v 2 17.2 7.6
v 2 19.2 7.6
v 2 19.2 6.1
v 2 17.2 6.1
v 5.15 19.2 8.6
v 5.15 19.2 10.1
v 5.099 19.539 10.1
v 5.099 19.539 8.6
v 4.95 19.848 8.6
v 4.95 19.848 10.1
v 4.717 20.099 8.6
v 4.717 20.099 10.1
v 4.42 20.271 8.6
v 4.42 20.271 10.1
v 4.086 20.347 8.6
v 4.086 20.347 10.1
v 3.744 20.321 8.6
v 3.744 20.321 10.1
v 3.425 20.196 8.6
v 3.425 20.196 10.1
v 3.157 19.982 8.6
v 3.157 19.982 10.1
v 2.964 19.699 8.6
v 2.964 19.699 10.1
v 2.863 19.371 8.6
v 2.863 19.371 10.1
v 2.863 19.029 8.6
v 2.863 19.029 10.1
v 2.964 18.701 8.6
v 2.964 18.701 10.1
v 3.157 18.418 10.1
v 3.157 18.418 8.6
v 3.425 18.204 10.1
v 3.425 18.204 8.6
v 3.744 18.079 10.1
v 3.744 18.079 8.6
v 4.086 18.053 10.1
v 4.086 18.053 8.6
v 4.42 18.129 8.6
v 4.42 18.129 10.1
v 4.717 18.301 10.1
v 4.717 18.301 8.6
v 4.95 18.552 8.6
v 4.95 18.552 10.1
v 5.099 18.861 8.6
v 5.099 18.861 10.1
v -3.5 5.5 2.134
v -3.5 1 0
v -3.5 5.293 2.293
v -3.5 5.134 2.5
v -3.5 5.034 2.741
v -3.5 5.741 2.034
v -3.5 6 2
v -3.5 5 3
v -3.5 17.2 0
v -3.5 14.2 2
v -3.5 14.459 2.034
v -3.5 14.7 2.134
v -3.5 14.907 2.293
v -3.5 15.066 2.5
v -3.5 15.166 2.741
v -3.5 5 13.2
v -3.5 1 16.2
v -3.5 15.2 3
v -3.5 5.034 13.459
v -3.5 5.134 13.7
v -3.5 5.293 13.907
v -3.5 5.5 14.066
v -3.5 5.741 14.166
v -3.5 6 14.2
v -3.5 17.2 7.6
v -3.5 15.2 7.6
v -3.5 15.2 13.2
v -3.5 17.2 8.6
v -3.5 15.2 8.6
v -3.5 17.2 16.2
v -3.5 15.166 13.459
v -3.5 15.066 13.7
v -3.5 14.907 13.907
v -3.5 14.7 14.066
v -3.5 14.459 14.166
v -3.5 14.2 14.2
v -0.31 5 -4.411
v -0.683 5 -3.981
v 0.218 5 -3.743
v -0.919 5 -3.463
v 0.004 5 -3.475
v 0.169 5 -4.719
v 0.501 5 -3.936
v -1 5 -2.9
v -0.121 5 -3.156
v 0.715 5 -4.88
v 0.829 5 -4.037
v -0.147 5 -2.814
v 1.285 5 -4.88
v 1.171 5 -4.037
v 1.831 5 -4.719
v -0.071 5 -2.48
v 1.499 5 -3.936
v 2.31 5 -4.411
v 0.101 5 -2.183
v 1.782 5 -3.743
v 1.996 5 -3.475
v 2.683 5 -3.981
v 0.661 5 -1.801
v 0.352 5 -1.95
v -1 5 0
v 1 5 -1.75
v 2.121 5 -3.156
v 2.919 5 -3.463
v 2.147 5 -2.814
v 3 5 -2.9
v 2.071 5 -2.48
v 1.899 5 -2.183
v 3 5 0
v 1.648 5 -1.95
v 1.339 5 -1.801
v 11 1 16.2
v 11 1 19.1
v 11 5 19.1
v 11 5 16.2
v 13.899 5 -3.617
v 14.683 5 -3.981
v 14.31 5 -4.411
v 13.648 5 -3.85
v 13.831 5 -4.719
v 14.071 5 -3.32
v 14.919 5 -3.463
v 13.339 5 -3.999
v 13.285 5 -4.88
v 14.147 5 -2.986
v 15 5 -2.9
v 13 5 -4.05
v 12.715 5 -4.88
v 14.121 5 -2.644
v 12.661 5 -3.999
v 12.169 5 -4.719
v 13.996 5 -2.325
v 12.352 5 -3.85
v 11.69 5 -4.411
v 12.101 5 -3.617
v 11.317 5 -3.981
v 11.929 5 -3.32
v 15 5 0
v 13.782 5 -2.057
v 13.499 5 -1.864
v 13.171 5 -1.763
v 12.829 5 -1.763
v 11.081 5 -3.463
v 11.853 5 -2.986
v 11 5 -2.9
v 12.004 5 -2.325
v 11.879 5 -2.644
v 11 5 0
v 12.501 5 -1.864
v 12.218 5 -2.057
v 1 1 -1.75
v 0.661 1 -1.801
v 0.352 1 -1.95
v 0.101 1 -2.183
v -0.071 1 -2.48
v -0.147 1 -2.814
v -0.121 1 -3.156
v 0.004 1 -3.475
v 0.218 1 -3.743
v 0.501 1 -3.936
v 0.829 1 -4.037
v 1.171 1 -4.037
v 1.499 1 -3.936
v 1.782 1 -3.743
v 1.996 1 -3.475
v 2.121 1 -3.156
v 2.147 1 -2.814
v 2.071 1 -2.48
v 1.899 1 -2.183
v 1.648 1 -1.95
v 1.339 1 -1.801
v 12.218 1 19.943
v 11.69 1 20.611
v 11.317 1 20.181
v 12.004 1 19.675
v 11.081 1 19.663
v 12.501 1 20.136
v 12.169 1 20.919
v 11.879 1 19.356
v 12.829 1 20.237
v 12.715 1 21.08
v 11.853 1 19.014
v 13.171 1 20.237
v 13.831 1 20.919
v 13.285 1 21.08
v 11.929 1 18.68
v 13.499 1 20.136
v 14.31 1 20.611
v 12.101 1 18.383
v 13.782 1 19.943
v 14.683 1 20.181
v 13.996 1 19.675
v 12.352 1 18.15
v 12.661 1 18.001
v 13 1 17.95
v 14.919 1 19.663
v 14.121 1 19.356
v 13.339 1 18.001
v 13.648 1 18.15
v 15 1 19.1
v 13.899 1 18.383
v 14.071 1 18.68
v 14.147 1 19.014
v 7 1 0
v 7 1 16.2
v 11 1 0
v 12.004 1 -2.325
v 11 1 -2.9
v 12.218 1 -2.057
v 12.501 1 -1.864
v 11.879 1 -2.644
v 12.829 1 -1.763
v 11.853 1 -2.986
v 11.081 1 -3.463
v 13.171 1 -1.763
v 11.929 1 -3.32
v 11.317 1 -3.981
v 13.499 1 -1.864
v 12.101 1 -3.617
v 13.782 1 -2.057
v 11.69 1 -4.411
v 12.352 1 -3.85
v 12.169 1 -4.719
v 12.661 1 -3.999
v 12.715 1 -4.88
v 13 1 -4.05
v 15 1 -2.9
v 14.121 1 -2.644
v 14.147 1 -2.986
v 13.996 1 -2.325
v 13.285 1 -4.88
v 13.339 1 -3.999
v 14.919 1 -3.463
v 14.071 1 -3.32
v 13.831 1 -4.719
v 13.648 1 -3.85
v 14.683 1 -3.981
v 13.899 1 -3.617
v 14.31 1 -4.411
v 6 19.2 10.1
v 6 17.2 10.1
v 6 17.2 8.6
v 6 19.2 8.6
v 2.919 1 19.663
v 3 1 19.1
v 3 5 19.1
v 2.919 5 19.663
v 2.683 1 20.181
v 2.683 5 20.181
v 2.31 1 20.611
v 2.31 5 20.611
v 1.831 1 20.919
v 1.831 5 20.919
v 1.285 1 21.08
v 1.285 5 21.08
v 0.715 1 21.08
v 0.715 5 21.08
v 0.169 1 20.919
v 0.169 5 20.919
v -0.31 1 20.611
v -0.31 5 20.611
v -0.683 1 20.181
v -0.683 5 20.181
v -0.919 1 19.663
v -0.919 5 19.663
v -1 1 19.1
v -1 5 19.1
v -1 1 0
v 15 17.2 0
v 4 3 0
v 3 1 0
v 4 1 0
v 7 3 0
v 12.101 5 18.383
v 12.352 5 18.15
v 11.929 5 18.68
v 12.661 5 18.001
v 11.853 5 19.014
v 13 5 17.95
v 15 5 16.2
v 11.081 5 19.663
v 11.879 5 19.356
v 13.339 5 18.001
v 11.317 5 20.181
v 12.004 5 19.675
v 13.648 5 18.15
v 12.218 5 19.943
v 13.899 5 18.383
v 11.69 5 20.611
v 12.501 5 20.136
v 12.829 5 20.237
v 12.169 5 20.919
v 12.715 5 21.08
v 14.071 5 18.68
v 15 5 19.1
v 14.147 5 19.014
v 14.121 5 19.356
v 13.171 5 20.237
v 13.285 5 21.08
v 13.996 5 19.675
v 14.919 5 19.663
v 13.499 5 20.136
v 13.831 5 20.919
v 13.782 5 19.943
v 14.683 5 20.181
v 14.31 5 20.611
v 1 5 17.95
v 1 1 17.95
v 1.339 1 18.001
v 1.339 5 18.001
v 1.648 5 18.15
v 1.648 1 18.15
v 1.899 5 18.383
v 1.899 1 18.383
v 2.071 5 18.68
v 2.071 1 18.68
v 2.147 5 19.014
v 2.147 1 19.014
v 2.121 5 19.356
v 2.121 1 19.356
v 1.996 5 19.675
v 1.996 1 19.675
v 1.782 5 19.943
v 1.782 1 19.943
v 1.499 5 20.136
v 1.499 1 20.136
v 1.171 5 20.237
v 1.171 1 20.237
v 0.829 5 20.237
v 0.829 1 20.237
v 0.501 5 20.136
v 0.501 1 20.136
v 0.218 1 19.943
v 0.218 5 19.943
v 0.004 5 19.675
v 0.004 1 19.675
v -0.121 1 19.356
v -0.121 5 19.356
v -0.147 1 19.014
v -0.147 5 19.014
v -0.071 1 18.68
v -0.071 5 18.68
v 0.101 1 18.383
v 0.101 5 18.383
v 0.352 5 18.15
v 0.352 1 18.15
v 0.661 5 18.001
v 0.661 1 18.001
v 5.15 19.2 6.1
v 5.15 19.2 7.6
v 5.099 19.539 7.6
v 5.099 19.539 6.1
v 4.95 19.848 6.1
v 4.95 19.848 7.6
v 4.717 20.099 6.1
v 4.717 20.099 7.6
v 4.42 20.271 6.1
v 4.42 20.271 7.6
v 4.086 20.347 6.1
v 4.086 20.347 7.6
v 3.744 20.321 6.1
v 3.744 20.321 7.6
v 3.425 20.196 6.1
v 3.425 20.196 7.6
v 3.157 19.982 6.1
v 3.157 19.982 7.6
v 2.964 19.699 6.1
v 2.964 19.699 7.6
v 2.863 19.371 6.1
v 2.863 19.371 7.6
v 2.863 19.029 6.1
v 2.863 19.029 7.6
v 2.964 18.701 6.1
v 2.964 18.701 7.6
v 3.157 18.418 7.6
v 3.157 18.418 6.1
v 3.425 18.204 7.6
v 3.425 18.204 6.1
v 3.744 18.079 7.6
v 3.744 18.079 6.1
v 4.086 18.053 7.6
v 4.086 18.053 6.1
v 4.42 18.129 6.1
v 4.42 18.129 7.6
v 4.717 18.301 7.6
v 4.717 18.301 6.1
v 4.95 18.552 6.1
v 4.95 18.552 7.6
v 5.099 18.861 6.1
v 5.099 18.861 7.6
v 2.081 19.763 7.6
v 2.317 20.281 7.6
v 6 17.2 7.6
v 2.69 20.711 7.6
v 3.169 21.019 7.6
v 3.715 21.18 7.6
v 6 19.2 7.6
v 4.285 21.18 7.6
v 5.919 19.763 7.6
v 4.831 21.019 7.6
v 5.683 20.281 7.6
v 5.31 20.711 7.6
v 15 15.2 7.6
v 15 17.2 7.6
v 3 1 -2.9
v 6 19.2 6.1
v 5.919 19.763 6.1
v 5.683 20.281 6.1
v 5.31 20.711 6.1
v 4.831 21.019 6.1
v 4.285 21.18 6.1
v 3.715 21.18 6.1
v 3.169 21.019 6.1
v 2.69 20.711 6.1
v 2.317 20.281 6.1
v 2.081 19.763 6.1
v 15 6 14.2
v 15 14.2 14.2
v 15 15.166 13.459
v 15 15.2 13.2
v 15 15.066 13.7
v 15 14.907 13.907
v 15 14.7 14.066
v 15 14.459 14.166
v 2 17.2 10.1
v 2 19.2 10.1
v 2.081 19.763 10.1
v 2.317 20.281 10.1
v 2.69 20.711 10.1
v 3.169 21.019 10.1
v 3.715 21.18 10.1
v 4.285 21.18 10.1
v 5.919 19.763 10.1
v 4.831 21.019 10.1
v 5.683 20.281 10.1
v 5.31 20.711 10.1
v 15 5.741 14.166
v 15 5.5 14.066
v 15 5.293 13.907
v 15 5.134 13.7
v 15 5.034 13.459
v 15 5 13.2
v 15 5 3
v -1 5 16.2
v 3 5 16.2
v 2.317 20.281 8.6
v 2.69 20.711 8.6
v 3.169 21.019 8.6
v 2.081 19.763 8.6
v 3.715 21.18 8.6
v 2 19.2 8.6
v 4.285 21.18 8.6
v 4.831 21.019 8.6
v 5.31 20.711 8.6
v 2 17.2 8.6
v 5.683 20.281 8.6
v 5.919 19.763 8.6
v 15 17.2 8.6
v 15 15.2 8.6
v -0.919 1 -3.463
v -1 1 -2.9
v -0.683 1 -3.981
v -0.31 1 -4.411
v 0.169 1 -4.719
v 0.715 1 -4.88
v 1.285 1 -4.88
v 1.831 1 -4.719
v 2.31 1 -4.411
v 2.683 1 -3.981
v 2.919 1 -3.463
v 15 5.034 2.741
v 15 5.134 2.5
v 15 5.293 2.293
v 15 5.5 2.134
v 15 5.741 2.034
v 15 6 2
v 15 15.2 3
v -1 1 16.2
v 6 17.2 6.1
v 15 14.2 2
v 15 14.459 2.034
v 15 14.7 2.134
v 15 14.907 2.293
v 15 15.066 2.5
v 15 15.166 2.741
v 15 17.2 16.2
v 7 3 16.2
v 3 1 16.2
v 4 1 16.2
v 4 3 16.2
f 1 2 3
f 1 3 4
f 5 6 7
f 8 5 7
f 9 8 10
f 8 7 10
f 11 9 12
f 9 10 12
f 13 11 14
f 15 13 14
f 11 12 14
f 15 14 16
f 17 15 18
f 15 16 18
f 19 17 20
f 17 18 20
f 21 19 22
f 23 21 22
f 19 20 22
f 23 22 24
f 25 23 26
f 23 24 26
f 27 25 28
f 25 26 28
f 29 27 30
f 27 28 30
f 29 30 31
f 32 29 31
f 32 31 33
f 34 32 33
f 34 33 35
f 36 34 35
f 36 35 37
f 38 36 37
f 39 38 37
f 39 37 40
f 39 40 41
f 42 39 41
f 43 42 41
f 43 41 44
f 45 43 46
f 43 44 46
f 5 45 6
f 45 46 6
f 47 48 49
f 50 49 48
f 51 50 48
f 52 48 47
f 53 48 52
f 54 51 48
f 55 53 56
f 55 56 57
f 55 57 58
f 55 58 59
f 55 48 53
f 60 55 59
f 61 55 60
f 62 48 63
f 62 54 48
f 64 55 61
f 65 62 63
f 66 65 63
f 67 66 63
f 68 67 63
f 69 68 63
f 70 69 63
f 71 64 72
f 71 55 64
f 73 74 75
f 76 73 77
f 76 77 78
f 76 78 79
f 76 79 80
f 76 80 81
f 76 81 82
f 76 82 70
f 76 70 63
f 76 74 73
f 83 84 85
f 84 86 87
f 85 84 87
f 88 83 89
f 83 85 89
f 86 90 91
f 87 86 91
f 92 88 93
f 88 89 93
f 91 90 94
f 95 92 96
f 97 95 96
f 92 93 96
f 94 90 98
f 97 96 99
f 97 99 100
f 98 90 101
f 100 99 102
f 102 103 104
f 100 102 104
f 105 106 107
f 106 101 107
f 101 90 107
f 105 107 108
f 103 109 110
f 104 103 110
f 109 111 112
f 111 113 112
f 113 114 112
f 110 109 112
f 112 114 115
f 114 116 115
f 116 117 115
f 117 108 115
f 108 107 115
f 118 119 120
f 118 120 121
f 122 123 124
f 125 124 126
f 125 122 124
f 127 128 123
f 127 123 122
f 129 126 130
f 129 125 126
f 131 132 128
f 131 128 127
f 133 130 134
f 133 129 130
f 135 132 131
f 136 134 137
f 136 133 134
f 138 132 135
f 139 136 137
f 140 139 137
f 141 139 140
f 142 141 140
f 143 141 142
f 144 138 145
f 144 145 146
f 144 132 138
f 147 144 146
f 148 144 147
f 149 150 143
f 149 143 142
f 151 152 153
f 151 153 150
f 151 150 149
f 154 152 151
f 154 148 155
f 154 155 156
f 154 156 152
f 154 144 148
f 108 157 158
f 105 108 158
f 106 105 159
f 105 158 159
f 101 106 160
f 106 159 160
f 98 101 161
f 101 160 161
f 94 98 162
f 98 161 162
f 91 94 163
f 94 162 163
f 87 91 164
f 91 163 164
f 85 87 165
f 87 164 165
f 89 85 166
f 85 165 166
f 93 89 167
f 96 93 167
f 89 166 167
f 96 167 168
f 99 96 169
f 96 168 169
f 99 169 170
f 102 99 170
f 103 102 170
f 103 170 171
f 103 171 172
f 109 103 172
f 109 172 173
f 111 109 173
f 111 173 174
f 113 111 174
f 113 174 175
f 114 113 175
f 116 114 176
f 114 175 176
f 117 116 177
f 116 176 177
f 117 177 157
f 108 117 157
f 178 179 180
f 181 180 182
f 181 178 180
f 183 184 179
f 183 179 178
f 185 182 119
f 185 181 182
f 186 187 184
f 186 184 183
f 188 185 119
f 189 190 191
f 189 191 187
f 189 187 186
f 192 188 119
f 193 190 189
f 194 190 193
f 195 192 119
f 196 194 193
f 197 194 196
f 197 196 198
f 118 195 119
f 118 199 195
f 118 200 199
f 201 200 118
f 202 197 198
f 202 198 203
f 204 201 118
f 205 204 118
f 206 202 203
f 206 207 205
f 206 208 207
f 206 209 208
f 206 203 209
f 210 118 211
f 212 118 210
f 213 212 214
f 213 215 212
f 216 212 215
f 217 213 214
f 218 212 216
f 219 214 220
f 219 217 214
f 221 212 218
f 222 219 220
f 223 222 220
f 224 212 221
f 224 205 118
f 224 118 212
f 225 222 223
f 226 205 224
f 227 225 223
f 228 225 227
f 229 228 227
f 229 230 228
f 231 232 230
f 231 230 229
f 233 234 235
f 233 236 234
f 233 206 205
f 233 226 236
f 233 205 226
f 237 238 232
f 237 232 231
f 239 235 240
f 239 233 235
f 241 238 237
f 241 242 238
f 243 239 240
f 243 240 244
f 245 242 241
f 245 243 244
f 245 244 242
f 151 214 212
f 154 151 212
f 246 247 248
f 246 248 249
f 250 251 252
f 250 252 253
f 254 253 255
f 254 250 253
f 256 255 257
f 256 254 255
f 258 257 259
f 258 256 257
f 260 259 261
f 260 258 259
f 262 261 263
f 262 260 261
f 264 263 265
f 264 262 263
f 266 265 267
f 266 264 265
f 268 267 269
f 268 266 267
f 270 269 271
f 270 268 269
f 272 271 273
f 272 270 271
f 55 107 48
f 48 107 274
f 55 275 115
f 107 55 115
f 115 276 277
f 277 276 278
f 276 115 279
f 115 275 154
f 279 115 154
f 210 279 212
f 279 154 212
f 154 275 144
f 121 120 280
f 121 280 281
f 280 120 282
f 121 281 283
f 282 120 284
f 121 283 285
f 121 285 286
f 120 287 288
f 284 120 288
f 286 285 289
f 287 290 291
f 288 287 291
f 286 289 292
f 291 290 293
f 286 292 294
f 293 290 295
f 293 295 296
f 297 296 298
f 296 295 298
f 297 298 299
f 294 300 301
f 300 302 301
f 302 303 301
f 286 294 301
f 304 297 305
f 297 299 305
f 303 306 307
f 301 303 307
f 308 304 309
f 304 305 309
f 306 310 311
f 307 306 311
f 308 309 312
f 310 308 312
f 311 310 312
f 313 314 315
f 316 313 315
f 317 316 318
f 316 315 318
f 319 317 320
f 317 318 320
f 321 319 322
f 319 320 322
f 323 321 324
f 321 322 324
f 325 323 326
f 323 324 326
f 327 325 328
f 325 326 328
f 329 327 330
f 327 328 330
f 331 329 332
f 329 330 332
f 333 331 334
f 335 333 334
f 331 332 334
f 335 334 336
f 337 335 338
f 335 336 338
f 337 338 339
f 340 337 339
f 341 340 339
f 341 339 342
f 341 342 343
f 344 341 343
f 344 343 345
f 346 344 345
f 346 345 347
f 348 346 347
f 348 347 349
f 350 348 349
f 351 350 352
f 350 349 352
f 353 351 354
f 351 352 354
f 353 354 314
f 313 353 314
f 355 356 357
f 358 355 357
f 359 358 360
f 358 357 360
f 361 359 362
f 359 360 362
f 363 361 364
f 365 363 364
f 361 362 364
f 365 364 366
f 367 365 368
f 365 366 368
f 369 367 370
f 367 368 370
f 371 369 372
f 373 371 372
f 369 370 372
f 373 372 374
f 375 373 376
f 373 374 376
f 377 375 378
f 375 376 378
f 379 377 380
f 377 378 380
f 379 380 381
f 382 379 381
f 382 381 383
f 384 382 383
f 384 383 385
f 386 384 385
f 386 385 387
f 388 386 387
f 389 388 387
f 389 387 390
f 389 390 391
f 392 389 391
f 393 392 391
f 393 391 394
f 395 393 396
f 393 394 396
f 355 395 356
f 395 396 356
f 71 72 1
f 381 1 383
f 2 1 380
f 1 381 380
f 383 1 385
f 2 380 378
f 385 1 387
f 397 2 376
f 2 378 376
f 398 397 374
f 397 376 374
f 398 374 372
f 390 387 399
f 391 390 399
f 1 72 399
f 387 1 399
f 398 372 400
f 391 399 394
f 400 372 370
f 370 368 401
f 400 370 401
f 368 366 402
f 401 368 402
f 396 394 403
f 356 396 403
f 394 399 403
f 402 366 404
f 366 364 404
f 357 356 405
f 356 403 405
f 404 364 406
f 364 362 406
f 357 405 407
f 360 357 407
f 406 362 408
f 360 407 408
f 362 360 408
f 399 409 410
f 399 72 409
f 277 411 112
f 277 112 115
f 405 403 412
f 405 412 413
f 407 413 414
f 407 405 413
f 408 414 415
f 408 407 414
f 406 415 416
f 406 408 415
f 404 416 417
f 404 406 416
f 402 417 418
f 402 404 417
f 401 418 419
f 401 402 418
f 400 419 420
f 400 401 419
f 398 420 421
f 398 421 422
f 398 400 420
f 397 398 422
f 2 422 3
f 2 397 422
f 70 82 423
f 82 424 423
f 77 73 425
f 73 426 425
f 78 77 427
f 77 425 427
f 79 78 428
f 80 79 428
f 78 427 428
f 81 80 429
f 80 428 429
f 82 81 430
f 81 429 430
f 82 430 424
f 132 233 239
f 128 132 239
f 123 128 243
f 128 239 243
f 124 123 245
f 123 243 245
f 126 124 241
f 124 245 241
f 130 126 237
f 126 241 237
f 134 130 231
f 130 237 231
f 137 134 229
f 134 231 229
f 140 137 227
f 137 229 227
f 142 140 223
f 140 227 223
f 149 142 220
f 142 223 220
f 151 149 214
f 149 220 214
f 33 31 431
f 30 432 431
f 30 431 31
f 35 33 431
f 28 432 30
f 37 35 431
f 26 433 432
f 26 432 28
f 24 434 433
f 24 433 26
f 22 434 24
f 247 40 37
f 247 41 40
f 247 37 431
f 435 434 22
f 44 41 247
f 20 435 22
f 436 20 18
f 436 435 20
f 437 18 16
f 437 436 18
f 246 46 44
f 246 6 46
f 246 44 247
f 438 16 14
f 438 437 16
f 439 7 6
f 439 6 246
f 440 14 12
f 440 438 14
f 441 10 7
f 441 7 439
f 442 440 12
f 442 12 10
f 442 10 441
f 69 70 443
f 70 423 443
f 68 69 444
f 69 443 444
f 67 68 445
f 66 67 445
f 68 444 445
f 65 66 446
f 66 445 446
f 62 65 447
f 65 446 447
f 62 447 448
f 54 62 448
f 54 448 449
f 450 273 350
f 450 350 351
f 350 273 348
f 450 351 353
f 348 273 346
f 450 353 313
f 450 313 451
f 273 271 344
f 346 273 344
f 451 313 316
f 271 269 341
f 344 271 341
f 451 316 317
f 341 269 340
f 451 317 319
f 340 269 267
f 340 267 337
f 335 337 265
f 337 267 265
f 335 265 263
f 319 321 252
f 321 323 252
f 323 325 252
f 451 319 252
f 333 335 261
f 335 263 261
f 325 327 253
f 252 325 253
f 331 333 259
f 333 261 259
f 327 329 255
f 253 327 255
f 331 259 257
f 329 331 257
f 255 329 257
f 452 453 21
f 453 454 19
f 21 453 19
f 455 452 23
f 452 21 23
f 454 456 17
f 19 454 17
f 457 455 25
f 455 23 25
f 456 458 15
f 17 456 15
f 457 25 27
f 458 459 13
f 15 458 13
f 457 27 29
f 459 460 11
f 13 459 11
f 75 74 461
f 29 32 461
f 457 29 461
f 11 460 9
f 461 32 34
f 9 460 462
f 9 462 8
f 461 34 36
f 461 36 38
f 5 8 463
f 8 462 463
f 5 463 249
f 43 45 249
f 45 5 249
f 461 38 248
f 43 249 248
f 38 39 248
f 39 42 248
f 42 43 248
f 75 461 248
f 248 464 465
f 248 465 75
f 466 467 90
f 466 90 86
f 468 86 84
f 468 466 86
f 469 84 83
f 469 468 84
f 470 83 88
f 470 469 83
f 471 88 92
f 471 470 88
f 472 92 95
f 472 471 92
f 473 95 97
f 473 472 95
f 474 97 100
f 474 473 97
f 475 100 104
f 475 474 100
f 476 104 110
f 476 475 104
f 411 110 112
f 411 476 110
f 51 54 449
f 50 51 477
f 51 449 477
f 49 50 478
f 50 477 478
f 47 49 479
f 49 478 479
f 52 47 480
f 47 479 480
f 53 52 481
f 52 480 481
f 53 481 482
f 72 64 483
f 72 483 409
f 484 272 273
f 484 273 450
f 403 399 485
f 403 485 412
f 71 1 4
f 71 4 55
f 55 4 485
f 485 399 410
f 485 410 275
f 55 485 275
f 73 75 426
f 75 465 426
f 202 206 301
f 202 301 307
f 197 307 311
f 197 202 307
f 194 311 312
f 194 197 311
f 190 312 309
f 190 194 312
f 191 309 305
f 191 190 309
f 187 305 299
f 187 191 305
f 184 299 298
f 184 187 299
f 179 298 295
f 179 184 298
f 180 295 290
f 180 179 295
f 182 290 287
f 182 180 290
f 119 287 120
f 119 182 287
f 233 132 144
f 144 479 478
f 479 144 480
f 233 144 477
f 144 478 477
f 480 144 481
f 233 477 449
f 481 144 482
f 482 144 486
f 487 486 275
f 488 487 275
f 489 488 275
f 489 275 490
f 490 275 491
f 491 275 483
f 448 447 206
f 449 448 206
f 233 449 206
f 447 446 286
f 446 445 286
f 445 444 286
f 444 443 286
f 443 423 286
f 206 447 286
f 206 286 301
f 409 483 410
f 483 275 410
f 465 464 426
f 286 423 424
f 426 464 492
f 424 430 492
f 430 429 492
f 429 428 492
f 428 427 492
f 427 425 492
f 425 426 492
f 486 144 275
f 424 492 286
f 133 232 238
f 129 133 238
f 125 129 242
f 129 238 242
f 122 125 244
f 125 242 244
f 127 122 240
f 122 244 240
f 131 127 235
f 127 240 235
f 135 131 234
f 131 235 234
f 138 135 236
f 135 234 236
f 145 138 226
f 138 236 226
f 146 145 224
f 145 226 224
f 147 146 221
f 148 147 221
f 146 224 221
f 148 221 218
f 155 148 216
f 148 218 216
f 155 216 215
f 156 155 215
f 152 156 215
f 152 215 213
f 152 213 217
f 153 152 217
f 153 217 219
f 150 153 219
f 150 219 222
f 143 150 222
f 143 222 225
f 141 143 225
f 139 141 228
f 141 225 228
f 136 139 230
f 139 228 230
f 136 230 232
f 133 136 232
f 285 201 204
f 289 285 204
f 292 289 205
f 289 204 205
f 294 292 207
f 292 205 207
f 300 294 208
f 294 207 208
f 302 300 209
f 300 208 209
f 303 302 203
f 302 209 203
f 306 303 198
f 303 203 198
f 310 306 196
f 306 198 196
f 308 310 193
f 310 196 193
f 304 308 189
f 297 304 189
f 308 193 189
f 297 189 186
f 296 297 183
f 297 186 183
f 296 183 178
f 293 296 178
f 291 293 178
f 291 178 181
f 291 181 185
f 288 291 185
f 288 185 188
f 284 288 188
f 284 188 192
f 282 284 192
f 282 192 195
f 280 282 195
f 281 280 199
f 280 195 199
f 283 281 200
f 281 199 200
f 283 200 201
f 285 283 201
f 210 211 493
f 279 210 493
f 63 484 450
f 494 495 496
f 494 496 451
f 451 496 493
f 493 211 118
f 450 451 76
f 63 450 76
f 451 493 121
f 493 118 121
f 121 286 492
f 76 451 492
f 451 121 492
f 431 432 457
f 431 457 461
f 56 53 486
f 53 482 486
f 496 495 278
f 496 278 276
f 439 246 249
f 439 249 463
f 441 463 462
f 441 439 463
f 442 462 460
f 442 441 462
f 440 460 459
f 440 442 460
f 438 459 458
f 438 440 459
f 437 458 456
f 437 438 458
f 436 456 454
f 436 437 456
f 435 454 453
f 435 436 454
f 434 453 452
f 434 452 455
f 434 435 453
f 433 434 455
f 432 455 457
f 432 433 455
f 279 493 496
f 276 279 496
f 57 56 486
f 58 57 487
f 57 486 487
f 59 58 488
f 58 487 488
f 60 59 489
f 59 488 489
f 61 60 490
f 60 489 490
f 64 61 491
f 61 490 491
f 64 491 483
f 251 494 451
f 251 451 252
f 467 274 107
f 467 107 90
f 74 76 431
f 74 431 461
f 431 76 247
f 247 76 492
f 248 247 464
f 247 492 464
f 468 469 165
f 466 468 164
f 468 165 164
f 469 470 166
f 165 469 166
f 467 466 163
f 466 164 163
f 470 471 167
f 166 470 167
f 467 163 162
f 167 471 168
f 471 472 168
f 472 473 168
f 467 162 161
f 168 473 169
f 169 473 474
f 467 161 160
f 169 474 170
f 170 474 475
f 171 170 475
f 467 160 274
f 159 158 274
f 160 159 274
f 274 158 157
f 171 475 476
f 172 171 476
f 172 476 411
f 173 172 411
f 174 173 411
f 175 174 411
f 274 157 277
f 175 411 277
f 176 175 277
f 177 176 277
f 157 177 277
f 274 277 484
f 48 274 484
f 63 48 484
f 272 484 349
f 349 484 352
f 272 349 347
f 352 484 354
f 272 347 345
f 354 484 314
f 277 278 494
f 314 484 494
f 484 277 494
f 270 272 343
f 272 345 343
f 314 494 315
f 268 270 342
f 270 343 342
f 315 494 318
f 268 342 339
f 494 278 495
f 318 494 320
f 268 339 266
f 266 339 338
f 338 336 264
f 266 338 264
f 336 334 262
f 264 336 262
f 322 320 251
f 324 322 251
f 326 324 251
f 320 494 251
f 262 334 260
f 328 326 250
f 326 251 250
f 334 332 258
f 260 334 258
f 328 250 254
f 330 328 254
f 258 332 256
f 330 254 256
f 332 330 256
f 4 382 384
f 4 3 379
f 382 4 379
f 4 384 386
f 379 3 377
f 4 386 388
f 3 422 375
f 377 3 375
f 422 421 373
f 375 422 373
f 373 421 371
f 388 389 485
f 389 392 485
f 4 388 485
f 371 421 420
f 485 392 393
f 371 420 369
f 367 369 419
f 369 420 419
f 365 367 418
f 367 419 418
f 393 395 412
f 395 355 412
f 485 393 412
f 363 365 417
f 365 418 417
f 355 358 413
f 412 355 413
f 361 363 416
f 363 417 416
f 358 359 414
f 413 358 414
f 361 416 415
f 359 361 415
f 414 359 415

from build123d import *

# Parameters (mm, degrees)
SKETCH_1_W           = 8
SKETCH_1_H           = 5
SKETCH_1_R           = 1.15
EXTRUDE_1_DEPTH      = 4
SKETCH_2_W           = 10.5
SKETCH_2_H           = 8
SKETCH_2_R           = 1.15
EXTRUDE_2_DEPTH      = 7
EXTRUDE_4_DEPTH      = 15
SKETCH_6_R           = 1.15
EXTRUDE_5_DEPTH      = 1.5
EXTRUDE_START        = 2.5
SKETCH_6_2_R         = 1.15
EXTRUDE_6_DEPTH      = 1.5
CUT_EXTRUDE_2_DEPTH  = 3
FILLET_2_R           = 1
SKETCH_9_OUTSIDE_W   = 25.014
SKETCH_9_OUTSIDE_H   = 34.214
SKETCH_9_OUTSIDE_W_2 = 15
SKETCH_9_OUTSIDE_H_2 = 16.2
CUT_EXTRUDE_3_DEPTH  = 36.814522194
SKETCH_12_W          = 16.2
SKETCH_12_H          = 8
CUT_EXTRUDE_5_DEPTH  = 31.608495553
SKETCH_10_W          = 3
SKETCH_10_H          = 2
CUT_EXTRUDE_4_DEPTH  = 31.608495553
SKETCH_11_R          = 1.15
EXTRUDE_7_DEPTH      = 4
EXTRUDE_15_DEPTH     = 3.5


with BuildPart() as part:
    # 草图1 → 凸台-拉伸1 (new body)
    with BuildSketch(Plane(origin=(0, 0, 0), x_dir=(0, 0, -1), z_dir=(1, 0, 0))):
        with Locations((4, 2.5)):
            Rectangle(SKETCH_1_W, SKETCH_1_H)
        with Locations((2, 2.5)):
            Circle(SKETCH_1_R, mode=Mode.SUBTRACT)
        with Locations((6, 2.5)):
            Circle(SKETCH_1_R, mode=Mode.SUBTRACT)
    extrude(amount=EXTRUDE_1_DEPTH)

    # 草图2 → 凸台-拉伸2 (add)
    with BuildSketch(Plane.XZ):
        with Locations((5.25, -4)):
            Rectangle(SKETCH_2_W, SKETCH_2_H)
        with Locations(Location((8, -6, 0), (0, 0, 270))):
            Circle(SKETCH_2_R, mode=Mode.SUBTRACT)
        with Locations(Location((8, -2, 0), (0, 0, 270))):
            Circle(SKETCH_2_R, mode=Mode.SUBTRACT)
    extrude(amount=EXTRUDE_2_DEPTH)

    # 草图5 → 凸台-拉伸4 (add)
    with BuildSketch(Plane.ZY):
        Polygon((14.2, 5), (2, 5), (2, 15.2), (7.6, 15.2), (7.6, 17.2), (0, 17.2), (0, -7), (16.2, -7), (16.2, 17.2), (8.6, 17.2), (8.6, 15.2), (14.2, 15.2), align=None)
    extrude(amount=-EXTRUDE_4_DEPTH)

    # 草图6 → 凸台-拉伸5 (add)
    with BuildSketch(Plane.XY.offset(7.6)):
        with BuildLine():
            Line((2, 19.2), (2, 17.2))
            Line((2, 17.2), (6, 17.2))
            Line((6, 17.2), (6, 19.2))
            ThreePointArc((6, 19.2), (4, 21.2), (2, 19.2))
        make_face()
        with Locations((4, 19.2)):
            Circle(SKETCH_6_R, mode=Mode.SUBTRACT)
    extrude(amount=-EXTRUDE_5_DEPTH)

    # 草图6<2> → 凸台-拉伸6 (add)
    with BuildSketch(Plane.XY.offset(7.6).offset(EXTRUDE_START)):
        with BuildLine():
            Line((2, 19.2), (2, 17.2))
            Line((2, 17.2), (6, 17.2))
            Line((6, 17.2), (6, 19.2))
            ThreePointArc((6, 19.2), (4, 21.2), (2, 19.2))
        make_face()
        with Locations((4, 19.2)):
            Circle(SKETCH_6_2_R, mode=Mode.SUBTRACT)
    extrude(amount=-EXTRUDE_6_DEPTH)

    # 草图8 → 切除-拉伸2 (cut)
    with BuildSketch(Plane(origin=(0, 0, -8), x_dir=(-1, 0, 0), z_dir=(0, 0, -1))):
        Polygon((0, -3), (0, -7), (-4, -7), align=None)
    extrude(amount=-CUT_EXTRUDE_2_DEPTH, mode=Mode.SUBTRACT)

    # 圆角2
    fillet_2_edges = [part.edges().sort_by_distance(p)[0] for p in [
        (7.5, 15.2, 2),
        (7.5, 5, 2),
        (7.5, 5, 14.2),
        (7.5, 15.2, 14.2),
    ]]
    fillet(fillet_2_edges, radius=FILLET_2_R)

    # 草图9 outside → 切除-拉伸3 (cut, through all)
    with BuildSketch(Plane.XZ.offset(7)):
        with Locations((7.5, 4.1)):
            Rectangle(SKETCH_9_OUTSIDE_W, SKETCH_9_OUTSIDE_H)
        with Locations((7.5, 8.1)):
            Rectangle(SKETCH_9_OUTSIDE_W_2, SKETCH_9_OUTSIDE_H_2, mode=Mode.SUBTRACT)
    extrude(amount=-CUT_EXTRUDE_3_DEPTH, mode=Mode.SUBTRACT)

    # 草图12 → 切除-拉伸5 (cut, through all)
    with BuildSketch(Plane(origin=(15, 0, 0), x_dir=(0, 0, -1), z_dir=(1, 0, 0))):
        with Locations((-8.1, -3)):
            Rectangle(SKETCH_12_W, SKETCH_12_H)
    extrude(amount=-CUT_EXTRUDE_5_DEPTH, mode=Mode.SUBTRACT)

    # 草图10 → 切除-拉伸4 (cut, through all)
    with BuildSketch(Plane(origin=(0, 0, 0), x_dir=(-1, 0, 0), z_dir=(0, 0, -1))):
        with Locations((-5.5, 2)):
            Rectangle(SKETCH_10_W, SKETCH_10_H)
    extrude(amount=-CUT_EXTRUDE_4_DEPTH, mode=Mode.SUBTRACT)

    # 草图11 → 凸台-拉伸7 (add)
    # profile 1 of 3: a face of its own
    with BuildSketch(Plane.XZ.offset(-1)):
        with BuildLine():
            Line((0, 16.2), (3, 16.2))
            Line((3, 16.2), (3, 19.1))
            ThreePointArc((3, 19.1), (1, 21.1), (-1, 19.1))
            Line((-1, 19.1), (-1, -2.9))
            ThreePointArc((-1, -2.9), (1, -4.9), (3, -2.9))
            Line((3, -2.9), (3, 0))
            Line((3, 0), (0, 0))
            Line((0, 0), (0, 16.2))
        make_face()
        with Locations(Location((1, 19.1, 0), (0, 0, 270))):
            Circle(SKETCH_11_R, mode=Mode.SUBTRACT)
        with Locations(Location((1, -2.9, 0), (0, 0, 90))):
            Circle(SKETCH_11_R, mode=Mode.SUBTRACT)
    # profile 2 of 3: a face of its own
    with BuildSketch(Plane.XZ.offset(-1)):
        with BuildLine():
            Line((11, 19.1), (11, 16.2))
            Line((11, 16.2), (15, 16.2))
            Line((15, 16.2), (15, 19.1))
            ThreePointArc((15, 19.1), (13, 21.1), (11, 19.1))
        make_face()
        with Locations(Location((13, 19.1, 0), (0, 0, 270))):
            Circle(SKETCH_11_R, mode=Mode.SUBTRACT)
    # profile 3 of 3: a face of its own
    with BuildSketch(Plane.XZ.offset(-1)):
        with BuildLine():
            Line((11, -2.9), (11, 0))
            Line((11, 0), (15, 0))
            Line((15, 0), (15, -2.9))
            ThreePointArc((15, -2.9), (13, -4.9), (11, -2.9))
        make_face()
        with Locations(Location((13, -2.9, 0), (0, 0, 270))):
            Circle(SKETCH_11_R, mode=Mode.SUBTRACT)
    extrude(amount=-EXTRUDE_7_DEPTH)

    # 草图22 → 凸台-拉伸15 (add)
    with BuildSketch(Plane.ZY):
        with BuildLine():
            Line((16.2, 5), (16.2, 17.2))
            Line((16.2, 17.2), (8.6, 17.2))
            Line((8.6, 17.2), (8.6, 15.2))
            Line((8.6, 15.2), (13.2, 15.2))
            ThreePointArc((13.2, 15.2), (13.907106781, 14.907106781), (14.2, 14.2))
            Line((14.2, 14.2), (14.2, 6))
            ThreePointArc((14.2, 6), (13.907106781, 5.292893219), (13.2, 5))
            Line((13.2, 5), (3, 5))
            ThreePointArc((3, 5), (2.292893219, 5.292893219), (2, 6))
            Line((2, 6), (2, 14.2))
            ThreePointArc((2, 14.2), (2.292893219, 14.907106781), (3, 15.2))
            Line((3, 15.2), (7.6, 15.2))
            Line((7.6, 15.2), (7.6, 17.2))
            Line((7.6, 17.2), (0, 17.2))
            Line((0, 17.2), (0, 5))
            Line((0, 5), (0, 1))
            Line((0, 1), (16.2, 1))
            Line((16.2, 1), (16.2, 5))
        make_face()
    extrude(amount=EXTRUDE_15_DEPTH)


solid = part.part
